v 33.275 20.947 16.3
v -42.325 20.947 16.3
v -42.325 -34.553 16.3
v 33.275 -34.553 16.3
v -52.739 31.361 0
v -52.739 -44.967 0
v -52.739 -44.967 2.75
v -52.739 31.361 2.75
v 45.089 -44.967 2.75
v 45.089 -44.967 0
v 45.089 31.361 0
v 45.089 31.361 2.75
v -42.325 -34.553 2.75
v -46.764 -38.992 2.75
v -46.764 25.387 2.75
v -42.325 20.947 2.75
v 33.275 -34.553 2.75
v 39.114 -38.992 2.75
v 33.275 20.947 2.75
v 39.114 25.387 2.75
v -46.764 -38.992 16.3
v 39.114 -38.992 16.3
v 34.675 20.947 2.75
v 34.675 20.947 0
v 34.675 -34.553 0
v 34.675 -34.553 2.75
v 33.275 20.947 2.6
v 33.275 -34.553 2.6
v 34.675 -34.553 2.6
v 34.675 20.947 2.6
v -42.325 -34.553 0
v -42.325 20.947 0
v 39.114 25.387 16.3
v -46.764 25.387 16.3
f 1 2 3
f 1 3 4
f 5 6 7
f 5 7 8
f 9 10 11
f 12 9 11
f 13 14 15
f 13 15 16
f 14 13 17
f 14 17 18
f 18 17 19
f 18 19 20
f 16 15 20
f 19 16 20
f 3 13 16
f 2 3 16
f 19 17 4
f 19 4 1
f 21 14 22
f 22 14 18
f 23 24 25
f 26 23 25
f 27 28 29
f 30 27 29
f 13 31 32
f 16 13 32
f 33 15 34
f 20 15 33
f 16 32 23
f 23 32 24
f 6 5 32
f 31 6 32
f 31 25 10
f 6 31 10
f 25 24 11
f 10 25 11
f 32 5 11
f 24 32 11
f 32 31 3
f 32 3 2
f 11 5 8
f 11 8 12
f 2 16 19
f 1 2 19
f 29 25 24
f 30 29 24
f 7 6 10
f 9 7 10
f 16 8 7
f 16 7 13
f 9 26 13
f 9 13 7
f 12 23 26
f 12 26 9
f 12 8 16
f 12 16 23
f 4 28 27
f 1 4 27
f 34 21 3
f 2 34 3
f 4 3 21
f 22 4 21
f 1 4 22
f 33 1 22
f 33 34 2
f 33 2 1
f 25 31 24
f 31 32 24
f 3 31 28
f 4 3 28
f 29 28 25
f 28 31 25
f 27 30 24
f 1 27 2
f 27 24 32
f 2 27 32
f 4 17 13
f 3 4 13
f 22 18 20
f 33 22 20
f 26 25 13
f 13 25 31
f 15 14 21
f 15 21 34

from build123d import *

# Parameters (mm, degrees)
F0_W     = 1.4
F0_H     = 55.5
F0_W_2   = 75.6
F1_DEPTH = 2.6
F2_DEPTH = 16.3
F0_W_3   = 97.8280026317
F0_H_2   = 76.3280026317
F3_DEPTH = 2.75
F5_W     = 1.4
F5_H     = 55.5
F6_DEPTH = 13.55
F5_W_2   = 85.8782771826
F5_H_2   = 64.3782771826
F7_DEPTH = 13.55


with BuildPart() as f1:
    # F0 (on Top) → F1 (new body)
    with BuildSketch(Plane.XY):
        with Locations((33.9750840545, -6.8025592566)):
            Rectangle(F0_W, F0_H)
        with Locations((-4.5249159455, -6.8025592566)):
            Rectangle(F0_W_2, F0_H)
    extrude(amount=F1_DEPTH)

    # F0 (on Top) → F2 (join)
    with BuildSketch(Plane.XY):
        with Locations((-4.5249159455, -6.8025592566)):
            Rectangle(F0_W_2, F0_H)
    extrude(amount=F2_DEPTH)


with BuildPart() as f3:
    # F0 (on Top) → F3 (new body)
    with BuildSketch(Plane.XY):
        with Locations((-3.8249159455, -6.8025592566)):
            Rectangle(F0_W_3, F0_H_2)
        Polygon((-42.3249159455, -34.5525592566), (-42.3249159455, 20.9474407434), (33.2750840545, 20.9474407434), (34.6750840545, 20.9474407434), (34.6750840545, -34.5525592566), (33.2750840545, -34.5525592566), align=None, mode=Mode.SUBTRACT)
    extrude(amount=F3_DEPTH)


with BuildPart() as f6:
    # F5 (on offset) → F6 (new body)
    with BuildSketch(Plane.XY.offset(2.75)):
        with Locations((33.9750840545, -6.8025592566)):
            Rectangle(F5_W, F5_H)
    extrude(amount=F6_DEPTH)

    # F5 (on offset) → F7 (join)
    with BuildSketch(Plane.XY.offset(2.75)):
        with Locations((-3.8249159455, -6.8025592566)):
            Rectangle(F5_W_2, F5_H_2)
        Polygon((-42.3249159455, -34.5525592566), (-42.3249159455, 20.9474407434), (33.2750840545, 20.9474407434), (34.6750840545, 20.9474407434), (34.6750840545, -34.5525592566), (33.2750840545, -34.5525592566), align=None, mode=Mode.SUBTRACT)
    extrude(amount=F7_DEPTH)


solid = Compound([f1.part, f3.part, f6.part])
